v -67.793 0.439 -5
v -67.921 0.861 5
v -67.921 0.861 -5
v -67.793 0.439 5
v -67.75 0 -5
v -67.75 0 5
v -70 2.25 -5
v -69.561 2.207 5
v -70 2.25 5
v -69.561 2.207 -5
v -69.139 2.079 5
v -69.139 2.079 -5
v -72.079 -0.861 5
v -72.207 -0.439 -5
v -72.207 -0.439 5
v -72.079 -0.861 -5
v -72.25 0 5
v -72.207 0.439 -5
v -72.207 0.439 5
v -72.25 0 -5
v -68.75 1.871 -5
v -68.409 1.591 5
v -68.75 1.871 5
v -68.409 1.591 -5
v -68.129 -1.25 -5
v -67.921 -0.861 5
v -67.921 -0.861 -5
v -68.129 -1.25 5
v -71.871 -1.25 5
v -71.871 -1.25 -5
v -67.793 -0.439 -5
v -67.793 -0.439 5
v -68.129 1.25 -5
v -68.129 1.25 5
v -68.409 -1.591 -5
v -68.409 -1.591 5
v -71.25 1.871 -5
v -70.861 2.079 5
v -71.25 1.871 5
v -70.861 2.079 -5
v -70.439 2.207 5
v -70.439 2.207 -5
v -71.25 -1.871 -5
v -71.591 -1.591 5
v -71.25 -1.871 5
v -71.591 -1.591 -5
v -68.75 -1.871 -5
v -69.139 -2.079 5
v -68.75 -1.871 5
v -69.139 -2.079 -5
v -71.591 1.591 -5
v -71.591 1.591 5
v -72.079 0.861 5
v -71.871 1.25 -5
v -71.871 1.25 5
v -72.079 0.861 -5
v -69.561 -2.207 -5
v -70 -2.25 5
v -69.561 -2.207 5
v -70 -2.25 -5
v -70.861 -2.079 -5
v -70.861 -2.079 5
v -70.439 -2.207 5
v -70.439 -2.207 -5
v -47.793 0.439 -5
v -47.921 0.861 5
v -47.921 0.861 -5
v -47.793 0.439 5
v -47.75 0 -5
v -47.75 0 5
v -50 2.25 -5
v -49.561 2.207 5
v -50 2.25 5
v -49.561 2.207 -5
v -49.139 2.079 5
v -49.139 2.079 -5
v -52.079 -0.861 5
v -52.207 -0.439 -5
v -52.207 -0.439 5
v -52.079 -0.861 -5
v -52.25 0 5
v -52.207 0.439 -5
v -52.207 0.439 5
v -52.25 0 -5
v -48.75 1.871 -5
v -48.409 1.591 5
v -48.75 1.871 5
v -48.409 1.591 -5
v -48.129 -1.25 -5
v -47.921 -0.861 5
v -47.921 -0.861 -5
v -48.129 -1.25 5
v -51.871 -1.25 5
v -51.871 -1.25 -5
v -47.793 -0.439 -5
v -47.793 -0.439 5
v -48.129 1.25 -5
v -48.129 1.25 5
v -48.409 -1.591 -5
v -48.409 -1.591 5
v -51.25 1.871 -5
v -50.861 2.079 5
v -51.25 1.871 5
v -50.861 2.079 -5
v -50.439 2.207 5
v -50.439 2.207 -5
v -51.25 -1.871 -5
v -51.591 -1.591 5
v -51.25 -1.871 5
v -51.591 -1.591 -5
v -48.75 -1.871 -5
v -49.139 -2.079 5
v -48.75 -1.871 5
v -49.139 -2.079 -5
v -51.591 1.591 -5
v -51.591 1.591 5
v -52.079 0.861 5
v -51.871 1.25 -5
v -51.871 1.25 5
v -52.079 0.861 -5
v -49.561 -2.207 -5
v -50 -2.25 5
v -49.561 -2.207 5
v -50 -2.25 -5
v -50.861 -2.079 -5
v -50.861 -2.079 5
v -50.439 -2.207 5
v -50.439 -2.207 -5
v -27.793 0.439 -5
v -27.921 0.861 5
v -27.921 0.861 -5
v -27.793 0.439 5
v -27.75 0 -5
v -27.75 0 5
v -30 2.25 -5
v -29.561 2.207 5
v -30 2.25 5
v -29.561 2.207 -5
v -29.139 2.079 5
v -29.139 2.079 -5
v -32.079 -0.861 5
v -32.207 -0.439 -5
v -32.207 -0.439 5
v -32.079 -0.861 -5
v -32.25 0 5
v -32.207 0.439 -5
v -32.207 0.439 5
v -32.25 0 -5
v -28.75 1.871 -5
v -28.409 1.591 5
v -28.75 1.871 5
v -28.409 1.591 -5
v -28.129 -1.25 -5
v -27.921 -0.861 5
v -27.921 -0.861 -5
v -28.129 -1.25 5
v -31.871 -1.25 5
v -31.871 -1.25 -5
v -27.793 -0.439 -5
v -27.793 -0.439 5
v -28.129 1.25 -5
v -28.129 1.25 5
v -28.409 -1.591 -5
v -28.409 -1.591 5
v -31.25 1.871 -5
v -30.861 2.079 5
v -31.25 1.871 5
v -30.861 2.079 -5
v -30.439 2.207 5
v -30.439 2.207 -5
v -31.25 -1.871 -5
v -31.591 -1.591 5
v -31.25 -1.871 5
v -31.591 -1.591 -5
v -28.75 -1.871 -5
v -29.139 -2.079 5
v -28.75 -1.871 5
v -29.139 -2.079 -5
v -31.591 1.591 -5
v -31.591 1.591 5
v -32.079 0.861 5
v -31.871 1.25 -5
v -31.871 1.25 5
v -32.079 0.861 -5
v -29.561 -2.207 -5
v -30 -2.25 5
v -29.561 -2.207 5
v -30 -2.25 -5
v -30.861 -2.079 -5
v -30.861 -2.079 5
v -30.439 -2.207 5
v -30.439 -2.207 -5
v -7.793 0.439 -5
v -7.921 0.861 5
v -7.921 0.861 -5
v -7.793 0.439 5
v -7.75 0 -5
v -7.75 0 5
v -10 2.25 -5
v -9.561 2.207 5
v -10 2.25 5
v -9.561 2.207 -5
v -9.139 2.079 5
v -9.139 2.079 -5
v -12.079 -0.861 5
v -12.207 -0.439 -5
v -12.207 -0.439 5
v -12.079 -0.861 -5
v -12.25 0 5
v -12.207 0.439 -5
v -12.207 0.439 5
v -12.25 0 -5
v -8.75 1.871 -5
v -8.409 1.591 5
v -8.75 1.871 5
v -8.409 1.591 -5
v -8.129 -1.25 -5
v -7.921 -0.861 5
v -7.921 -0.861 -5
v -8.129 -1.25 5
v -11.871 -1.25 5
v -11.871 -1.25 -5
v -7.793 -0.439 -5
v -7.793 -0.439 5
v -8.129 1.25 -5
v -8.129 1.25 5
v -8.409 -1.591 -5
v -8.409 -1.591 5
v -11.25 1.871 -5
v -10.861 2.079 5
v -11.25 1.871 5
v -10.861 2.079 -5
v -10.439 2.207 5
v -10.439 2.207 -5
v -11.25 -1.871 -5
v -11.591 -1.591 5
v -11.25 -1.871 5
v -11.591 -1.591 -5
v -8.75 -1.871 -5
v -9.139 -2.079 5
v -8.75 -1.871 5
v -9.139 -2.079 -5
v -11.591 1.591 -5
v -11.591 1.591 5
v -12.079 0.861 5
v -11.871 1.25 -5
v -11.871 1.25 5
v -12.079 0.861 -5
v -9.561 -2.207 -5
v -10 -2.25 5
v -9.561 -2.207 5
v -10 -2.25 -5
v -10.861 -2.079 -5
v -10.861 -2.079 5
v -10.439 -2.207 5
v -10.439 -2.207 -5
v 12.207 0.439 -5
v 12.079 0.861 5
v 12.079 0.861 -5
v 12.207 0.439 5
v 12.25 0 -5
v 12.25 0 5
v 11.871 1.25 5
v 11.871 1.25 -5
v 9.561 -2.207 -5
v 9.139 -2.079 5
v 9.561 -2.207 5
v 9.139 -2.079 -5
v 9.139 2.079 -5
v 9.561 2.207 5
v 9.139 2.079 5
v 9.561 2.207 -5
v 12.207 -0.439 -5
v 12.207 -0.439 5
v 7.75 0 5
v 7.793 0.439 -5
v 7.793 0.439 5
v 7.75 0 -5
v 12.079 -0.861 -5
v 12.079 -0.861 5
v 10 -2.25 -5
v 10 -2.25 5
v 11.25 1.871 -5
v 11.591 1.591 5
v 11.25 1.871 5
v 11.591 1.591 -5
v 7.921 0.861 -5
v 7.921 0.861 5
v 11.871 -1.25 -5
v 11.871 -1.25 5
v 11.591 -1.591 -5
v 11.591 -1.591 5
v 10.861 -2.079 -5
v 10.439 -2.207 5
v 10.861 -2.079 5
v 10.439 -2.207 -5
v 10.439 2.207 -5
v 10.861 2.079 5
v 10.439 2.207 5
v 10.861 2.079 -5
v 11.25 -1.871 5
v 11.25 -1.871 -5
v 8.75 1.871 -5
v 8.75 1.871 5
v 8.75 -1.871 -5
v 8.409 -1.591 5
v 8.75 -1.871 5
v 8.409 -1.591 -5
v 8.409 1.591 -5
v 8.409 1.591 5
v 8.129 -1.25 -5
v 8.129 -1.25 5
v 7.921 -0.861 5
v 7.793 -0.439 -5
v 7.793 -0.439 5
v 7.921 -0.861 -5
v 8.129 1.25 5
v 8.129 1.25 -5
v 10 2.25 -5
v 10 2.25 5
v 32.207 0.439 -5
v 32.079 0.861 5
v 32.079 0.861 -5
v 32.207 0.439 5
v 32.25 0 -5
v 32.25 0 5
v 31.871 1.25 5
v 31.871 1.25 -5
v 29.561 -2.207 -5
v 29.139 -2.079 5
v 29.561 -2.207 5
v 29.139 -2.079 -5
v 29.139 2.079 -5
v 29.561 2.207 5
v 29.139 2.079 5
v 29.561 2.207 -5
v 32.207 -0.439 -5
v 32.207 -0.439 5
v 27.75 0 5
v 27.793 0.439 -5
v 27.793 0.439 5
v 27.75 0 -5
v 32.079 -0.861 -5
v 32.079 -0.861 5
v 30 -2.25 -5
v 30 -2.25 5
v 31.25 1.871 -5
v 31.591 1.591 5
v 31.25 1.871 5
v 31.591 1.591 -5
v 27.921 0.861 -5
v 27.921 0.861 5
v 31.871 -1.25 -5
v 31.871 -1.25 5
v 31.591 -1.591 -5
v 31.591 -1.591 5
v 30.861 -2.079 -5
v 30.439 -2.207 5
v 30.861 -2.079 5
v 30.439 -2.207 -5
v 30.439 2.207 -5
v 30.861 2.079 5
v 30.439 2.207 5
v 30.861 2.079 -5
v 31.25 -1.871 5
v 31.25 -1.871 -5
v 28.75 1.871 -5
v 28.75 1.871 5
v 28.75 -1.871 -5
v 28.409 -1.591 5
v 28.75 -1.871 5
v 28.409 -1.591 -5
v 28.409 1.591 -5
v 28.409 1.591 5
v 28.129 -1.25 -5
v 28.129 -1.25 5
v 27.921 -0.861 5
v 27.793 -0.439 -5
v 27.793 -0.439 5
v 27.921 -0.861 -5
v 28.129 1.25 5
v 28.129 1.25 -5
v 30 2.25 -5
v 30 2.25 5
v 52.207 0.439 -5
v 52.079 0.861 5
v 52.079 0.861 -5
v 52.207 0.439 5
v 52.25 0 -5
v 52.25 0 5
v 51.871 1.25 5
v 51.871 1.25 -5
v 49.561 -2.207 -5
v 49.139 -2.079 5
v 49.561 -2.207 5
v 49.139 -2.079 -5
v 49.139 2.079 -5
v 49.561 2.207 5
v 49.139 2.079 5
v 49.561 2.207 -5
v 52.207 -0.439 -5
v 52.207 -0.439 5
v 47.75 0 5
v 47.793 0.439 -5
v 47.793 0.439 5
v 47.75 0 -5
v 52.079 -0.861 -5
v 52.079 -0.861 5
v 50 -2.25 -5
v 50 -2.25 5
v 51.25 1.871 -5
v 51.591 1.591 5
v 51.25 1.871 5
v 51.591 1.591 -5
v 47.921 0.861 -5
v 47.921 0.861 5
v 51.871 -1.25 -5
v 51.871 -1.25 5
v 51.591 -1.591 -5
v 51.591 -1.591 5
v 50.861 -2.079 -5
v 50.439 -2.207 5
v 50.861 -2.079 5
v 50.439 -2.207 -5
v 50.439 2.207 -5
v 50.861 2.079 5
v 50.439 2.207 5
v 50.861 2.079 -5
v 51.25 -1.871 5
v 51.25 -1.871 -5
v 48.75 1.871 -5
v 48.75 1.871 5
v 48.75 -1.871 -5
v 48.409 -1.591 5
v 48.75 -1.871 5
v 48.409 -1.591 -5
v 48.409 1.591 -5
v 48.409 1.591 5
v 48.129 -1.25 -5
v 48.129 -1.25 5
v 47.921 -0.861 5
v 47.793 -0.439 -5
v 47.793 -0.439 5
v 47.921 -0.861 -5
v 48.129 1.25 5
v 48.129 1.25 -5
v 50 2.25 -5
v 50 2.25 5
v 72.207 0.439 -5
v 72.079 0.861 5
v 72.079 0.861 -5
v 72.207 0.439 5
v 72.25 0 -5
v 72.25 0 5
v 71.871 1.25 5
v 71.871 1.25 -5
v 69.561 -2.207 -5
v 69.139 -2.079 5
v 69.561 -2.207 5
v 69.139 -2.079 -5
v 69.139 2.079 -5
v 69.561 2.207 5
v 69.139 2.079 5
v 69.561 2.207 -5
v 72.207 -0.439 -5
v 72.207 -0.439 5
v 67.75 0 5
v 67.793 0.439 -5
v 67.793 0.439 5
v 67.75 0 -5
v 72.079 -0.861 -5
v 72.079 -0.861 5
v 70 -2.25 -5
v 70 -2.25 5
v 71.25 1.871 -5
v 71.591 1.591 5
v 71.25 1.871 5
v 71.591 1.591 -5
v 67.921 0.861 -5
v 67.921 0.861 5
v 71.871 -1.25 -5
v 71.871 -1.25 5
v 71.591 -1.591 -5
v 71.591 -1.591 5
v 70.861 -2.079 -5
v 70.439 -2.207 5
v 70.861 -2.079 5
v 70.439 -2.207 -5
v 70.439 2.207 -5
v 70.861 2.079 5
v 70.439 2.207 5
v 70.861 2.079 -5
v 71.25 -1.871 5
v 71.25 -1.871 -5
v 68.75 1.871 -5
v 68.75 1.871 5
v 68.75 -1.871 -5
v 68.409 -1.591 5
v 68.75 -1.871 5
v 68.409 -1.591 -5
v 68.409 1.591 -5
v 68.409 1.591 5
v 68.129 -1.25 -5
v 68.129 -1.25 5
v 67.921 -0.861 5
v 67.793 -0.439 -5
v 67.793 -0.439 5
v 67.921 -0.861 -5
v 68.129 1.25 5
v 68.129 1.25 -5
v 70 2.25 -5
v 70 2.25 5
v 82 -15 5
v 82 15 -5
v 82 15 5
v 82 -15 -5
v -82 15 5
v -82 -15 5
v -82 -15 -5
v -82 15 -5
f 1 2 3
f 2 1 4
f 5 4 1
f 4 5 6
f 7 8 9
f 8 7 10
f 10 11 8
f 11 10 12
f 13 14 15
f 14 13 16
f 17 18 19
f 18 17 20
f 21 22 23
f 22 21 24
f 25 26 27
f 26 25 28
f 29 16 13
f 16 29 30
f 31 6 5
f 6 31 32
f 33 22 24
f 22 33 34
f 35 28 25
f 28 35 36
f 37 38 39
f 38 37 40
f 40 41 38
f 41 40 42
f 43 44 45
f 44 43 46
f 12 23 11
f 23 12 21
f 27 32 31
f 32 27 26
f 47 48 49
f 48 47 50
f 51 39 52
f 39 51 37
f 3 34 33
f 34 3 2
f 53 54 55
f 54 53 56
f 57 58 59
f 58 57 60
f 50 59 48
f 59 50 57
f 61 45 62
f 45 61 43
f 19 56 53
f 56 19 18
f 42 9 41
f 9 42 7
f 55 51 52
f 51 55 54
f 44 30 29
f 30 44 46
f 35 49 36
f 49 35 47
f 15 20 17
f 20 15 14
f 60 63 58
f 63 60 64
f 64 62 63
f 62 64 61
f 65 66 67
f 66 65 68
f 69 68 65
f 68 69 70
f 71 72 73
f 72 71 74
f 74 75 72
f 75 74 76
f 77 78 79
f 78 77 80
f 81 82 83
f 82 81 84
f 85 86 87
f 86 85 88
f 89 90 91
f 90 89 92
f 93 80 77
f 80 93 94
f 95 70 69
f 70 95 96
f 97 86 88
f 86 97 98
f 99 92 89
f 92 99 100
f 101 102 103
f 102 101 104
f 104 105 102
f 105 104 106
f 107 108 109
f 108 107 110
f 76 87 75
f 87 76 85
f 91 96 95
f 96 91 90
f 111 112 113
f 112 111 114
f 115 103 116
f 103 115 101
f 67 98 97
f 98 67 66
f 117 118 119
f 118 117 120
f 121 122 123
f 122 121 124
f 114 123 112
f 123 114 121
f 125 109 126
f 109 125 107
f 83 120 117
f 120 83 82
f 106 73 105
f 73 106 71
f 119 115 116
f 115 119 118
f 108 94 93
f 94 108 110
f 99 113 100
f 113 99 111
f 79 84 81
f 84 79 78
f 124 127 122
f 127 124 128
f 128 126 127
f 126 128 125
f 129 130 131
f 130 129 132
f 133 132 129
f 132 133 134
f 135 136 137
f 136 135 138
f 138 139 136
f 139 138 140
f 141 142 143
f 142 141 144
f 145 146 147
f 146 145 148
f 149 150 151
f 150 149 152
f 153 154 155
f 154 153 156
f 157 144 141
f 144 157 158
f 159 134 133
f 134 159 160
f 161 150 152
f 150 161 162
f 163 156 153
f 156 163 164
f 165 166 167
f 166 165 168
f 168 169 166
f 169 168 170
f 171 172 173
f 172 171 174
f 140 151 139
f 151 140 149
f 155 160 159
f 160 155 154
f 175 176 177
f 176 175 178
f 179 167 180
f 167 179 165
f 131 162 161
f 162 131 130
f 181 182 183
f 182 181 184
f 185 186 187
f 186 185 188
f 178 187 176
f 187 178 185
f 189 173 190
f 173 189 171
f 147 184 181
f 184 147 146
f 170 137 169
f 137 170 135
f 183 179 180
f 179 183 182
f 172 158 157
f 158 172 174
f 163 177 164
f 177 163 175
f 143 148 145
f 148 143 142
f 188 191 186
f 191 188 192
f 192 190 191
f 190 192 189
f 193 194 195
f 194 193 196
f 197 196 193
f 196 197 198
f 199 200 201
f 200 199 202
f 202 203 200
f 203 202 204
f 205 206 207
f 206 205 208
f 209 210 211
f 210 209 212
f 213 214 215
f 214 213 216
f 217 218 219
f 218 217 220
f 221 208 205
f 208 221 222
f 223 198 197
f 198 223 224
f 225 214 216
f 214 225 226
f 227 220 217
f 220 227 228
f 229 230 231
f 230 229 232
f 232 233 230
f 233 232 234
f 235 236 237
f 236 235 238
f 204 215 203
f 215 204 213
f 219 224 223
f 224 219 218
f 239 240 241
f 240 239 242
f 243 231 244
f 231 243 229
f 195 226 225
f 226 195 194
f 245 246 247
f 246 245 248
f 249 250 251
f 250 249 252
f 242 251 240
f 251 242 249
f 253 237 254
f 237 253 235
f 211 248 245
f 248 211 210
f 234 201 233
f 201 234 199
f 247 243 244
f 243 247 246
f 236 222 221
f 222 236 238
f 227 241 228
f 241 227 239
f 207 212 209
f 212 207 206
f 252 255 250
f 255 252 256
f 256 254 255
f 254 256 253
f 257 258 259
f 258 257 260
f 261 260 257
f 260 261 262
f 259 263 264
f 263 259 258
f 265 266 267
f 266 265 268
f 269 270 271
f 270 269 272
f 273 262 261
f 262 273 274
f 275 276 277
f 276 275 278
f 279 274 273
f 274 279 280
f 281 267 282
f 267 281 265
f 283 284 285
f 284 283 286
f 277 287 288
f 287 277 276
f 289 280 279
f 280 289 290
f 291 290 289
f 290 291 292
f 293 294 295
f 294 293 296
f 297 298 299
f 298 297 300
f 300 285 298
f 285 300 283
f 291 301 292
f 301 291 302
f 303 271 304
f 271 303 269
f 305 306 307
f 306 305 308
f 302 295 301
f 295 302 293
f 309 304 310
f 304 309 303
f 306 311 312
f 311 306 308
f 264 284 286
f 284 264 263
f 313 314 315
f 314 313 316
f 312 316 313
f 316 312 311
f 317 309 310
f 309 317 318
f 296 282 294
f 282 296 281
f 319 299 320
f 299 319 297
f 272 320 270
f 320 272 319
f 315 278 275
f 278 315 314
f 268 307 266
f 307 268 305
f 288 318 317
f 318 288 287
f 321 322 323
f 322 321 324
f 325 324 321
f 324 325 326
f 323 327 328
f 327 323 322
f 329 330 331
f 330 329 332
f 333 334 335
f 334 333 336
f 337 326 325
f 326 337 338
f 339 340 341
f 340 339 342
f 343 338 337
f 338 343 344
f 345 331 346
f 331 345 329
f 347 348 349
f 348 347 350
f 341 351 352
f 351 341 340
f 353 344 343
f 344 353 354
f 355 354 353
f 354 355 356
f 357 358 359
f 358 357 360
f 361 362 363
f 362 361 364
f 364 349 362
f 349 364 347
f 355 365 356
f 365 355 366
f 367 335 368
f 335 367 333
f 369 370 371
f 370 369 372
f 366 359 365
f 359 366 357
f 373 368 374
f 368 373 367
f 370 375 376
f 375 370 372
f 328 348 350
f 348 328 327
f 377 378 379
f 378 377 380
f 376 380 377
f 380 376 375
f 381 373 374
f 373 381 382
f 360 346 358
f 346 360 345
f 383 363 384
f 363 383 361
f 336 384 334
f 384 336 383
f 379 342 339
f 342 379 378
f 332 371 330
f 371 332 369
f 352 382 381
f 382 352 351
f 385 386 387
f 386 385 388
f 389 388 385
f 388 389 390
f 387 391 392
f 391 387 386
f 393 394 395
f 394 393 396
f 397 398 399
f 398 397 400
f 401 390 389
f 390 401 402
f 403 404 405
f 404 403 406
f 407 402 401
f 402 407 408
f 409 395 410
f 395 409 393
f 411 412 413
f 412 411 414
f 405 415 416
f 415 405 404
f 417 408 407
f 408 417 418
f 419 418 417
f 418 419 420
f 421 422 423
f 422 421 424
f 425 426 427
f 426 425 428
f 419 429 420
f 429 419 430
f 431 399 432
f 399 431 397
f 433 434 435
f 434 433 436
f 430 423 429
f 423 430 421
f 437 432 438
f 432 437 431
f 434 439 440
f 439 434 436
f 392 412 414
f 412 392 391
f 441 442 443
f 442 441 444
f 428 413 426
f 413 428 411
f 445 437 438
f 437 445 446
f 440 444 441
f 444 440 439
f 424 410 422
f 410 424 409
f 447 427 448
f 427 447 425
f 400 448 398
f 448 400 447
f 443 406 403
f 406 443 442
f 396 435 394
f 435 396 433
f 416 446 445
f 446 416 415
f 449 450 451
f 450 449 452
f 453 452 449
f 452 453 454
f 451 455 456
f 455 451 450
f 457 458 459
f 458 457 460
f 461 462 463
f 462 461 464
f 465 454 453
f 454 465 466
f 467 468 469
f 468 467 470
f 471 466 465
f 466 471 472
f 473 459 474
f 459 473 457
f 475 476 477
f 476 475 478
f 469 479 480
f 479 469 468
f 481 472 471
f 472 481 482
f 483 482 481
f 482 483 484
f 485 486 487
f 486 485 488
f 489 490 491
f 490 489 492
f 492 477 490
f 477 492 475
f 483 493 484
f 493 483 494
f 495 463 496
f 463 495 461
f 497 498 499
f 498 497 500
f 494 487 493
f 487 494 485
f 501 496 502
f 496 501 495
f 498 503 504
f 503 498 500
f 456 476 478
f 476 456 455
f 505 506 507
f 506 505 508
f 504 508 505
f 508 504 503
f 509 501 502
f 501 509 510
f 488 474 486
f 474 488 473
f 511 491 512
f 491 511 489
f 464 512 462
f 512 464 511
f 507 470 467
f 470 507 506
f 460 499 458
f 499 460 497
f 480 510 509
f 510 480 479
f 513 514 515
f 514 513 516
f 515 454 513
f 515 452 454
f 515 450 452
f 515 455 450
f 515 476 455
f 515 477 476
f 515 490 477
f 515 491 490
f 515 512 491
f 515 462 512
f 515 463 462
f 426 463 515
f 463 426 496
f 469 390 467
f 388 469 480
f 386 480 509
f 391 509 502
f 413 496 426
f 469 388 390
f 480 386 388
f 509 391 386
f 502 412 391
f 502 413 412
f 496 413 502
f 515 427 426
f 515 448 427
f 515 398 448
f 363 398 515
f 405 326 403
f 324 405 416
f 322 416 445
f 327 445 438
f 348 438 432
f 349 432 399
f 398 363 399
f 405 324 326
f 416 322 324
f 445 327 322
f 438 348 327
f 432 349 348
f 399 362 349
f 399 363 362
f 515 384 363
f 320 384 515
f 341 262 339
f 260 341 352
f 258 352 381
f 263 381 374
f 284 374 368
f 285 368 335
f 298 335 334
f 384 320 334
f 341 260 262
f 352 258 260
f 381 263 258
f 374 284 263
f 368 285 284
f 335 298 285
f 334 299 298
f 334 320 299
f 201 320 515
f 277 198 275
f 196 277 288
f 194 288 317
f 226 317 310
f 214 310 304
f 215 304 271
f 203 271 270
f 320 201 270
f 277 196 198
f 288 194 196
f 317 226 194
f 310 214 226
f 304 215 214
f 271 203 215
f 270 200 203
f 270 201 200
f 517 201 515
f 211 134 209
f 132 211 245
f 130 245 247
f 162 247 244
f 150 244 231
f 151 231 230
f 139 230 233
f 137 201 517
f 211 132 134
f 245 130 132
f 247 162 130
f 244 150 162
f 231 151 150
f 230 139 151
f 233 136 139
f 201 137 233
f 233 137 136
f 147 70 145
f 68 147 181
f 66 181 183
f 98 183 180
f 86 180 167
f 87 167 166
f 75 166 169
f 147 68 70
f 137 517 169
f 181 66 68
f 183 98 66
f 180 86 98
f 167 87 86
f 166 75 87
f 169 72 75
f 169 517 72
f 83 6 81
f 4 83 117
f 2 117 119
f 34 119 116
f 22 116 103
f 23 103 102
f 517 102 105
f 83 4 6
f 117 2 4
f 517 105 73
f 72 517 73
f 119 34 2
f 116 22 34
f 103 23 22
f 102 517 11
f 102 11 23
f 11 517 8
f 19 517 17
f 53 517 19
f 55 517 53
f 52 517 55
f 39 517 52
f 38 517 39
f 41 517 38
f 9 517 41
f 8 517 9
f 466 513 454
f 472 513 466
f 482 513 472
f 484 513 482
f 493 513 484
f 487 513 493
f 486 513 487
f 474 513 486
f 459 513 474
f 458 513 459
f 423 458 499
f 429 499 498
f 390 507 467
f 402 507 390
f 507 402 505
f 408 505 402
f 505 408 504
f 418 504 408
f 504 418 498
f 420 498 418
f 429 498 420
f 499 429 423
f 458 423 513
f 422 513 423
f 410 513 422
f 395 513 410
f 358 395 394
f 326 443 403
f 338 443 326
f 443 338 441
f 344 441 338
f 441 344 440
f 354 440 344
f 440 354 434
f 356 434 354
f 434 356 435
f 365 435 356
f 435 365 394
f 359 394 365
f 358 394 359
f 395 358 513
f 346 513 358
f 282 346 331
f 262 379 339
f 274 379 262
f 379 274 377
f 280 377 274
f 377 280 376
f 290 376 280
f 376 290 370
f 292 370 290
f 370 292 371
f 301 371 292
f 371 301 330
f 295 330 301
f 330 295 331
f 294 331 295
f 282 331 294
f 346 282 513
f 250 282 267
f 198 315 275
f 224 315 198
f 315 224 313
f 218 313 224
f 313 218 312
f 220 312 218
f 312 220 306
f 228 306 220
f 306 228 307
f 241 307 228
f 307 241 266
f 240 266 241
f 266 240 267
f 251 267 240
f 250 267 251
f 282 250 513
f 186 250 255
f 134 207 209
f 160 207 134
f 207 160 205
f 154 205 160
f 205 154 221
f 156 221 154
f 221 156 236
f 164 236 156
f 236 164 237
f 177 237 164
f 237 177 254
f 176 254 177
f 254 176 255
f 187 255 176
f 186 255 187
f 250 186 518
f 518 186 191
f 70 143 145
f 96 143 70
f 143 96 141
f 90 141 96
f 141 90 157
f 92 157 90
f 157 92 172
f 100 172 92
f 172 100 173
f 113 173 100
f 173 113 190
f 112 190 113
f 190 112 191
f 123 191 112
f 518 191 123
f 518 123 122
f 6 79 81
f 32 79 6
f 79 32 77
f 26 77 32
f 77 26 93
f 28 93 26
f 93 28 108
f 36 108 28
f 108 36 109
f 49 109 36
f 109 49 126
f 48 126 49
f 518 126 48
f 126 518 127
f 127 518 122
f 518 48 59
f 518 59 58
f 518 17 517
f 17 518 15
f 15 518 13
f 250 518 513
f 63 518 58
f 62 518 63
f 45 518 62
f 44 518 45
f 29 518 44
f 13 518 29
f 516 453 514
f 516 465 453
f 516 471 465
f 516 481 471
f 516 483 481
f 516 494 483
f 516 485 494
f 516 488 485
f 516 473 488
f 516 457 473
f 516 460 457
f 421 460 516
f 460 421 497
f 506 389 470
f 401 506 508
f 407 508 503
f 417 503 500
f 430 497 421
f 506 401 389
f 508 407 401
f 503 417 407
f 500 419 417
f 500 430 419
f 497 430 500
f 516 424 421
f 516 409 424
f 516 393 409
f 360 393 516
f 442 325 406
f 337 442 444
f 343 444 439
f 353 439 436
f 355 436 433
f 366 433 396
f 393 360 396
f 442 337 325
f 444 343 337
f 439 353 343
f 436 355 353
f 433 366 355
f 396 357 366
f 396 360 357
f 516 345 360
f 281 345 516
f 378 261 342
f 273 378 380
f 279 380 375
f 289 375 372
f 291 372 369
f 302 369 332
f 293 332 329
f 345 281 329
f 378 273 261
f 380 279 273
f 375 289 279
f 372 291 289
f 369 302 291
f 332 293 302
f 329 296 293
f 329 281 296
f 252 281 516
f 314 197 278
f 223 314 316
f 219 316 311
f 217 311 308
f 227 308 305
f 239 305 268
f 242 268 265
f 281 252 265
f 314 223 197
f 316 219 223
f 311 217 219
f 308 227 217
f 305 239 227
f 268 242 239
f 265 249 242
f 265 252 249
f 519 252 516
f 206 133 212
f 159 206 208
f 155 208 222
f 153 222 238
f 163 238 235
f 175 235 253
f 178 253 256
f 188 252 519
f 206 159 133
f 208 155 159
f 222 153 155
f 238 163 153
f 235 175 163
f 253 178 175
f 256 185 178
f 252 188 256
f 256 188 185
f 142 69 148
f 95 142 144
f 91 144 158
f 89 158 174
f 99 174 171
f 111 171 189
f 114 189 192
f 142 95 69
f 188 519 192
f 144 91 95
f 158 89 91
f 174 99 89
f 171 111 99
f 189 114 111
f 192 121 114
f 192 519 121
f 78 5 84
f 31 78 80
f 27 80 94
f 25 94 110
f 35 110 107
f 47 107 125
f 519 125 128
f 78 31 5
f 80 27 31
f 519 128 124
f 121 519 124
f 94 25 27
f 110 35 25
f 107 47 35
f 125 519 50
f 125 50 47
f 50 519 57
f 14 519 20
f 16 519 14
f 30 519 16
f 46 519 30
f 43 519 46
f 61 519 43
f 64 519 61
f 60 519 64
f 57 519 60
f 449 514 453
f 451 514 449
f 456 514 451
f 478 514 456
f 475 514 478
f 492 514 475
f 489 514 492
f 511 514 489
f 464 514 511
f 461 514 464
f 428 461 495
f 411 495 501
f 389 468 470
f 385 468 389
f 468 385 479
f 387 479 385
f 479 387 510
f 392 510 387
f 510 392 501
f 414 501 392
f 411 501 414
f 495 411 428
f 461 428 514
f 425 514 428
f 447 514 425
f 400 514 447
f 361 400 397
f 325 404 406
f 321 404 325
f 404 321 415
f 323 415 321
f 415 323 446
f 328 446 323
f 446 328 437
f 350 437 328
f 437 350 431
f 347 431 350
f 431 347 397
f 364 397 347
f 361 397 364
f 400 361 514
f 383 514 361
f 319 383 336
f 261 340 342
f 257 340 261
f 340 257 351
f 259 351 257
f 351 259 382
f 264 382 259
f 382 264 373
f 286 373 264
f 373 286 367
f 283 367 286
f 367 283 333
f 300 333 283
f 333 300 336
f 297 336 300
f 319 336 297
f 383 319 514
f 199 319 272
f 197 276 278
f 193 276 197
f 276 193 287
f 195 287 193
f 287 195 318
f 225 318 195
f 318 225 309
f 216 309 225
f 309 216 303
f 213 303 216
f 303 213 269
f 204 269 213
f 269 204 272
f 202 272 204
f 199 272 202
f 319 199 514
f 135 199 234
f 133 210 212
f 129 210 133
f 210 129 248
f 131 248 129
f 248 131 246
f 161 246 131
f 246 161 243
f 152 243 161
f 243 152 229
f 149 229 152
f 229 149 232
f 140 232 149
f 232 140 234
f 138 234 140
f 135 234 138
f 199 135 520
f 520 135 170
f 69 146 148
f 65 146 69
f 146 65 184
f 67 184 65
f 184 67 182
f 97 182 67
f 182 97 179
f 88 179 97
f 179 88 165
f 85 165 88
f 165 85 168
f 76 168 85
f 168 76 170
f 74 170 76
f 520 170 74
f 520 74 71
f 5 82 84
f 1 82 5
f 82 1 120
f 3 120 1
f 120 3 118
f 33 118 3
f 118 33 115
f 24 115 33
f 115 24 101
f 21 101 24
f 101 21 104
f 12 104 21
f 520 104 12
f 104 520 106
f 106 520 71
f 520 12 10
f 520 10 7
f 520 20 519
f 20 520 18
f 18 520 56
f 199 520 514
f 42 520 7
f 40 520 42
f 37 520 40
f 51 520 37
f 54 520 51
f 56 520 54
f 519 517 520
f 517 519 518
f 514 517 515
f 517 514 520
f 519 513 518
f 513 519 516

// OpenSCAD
$fn = 32;

// ----------------------------------------------------------------------
// Hole bar, 8 x Ø4.5
// skip layout, 12 mm edge offset
// ----------------------------------------------------------------------

// --- parameters (mm) ---
bar_w = 30;       // bar width (Y)
seat_tol = 0.1;   // tolerance at the seating features
free_tol = 0.5;   // general tolerance on the free sizes
bar_t = 10;       // bar thickness (Z)
holes = 8;        // holes per row
hole_d = 4.5;     // hole diameter
edge = 12;        // offset from the bar end to the first hole
grid_pitch = 10;  // grid the bar was laid out on

// --- derived feature positions (mm) ---
pitch = grid_pitch * 2;       // = 20   holes sit every other grid slot
span = (holes - 1) * pitch;   // = 140   distance between the end holes
bar_l = span + 2 * edge;      // = 164   overall bar length
start_x = -bar_l / 2 + edge;  // = -70   X of the first hole
feature_centers = [
  [start_x + 0 * pitch, 0],
  [start_x + 1 * pitch, 0],
  [start_x + 2 * pitch, 0],
  [start_x + 3 * pitch, 0],
  [start_x + 4 * pitch, 0],
  [start_x + 5 * pitch, 0],
  [start_x + 6 * pitch, 0],
  [start_x + 7 * pitch, 0]
];   // hole centres of the first row

// bar with one row of holes, drilled from feature_centers
difference() {
  translate([-bar_l / 2, -bar_w / 2, -bar_t / 2]) cube([bar_l, bar_w, bar_t]);
  for (centre = feature_centers)
    translate([centre[0], centre[1], 0])
      cylinder(d = hole_d, h = bar_t + 2, center = true);
}
